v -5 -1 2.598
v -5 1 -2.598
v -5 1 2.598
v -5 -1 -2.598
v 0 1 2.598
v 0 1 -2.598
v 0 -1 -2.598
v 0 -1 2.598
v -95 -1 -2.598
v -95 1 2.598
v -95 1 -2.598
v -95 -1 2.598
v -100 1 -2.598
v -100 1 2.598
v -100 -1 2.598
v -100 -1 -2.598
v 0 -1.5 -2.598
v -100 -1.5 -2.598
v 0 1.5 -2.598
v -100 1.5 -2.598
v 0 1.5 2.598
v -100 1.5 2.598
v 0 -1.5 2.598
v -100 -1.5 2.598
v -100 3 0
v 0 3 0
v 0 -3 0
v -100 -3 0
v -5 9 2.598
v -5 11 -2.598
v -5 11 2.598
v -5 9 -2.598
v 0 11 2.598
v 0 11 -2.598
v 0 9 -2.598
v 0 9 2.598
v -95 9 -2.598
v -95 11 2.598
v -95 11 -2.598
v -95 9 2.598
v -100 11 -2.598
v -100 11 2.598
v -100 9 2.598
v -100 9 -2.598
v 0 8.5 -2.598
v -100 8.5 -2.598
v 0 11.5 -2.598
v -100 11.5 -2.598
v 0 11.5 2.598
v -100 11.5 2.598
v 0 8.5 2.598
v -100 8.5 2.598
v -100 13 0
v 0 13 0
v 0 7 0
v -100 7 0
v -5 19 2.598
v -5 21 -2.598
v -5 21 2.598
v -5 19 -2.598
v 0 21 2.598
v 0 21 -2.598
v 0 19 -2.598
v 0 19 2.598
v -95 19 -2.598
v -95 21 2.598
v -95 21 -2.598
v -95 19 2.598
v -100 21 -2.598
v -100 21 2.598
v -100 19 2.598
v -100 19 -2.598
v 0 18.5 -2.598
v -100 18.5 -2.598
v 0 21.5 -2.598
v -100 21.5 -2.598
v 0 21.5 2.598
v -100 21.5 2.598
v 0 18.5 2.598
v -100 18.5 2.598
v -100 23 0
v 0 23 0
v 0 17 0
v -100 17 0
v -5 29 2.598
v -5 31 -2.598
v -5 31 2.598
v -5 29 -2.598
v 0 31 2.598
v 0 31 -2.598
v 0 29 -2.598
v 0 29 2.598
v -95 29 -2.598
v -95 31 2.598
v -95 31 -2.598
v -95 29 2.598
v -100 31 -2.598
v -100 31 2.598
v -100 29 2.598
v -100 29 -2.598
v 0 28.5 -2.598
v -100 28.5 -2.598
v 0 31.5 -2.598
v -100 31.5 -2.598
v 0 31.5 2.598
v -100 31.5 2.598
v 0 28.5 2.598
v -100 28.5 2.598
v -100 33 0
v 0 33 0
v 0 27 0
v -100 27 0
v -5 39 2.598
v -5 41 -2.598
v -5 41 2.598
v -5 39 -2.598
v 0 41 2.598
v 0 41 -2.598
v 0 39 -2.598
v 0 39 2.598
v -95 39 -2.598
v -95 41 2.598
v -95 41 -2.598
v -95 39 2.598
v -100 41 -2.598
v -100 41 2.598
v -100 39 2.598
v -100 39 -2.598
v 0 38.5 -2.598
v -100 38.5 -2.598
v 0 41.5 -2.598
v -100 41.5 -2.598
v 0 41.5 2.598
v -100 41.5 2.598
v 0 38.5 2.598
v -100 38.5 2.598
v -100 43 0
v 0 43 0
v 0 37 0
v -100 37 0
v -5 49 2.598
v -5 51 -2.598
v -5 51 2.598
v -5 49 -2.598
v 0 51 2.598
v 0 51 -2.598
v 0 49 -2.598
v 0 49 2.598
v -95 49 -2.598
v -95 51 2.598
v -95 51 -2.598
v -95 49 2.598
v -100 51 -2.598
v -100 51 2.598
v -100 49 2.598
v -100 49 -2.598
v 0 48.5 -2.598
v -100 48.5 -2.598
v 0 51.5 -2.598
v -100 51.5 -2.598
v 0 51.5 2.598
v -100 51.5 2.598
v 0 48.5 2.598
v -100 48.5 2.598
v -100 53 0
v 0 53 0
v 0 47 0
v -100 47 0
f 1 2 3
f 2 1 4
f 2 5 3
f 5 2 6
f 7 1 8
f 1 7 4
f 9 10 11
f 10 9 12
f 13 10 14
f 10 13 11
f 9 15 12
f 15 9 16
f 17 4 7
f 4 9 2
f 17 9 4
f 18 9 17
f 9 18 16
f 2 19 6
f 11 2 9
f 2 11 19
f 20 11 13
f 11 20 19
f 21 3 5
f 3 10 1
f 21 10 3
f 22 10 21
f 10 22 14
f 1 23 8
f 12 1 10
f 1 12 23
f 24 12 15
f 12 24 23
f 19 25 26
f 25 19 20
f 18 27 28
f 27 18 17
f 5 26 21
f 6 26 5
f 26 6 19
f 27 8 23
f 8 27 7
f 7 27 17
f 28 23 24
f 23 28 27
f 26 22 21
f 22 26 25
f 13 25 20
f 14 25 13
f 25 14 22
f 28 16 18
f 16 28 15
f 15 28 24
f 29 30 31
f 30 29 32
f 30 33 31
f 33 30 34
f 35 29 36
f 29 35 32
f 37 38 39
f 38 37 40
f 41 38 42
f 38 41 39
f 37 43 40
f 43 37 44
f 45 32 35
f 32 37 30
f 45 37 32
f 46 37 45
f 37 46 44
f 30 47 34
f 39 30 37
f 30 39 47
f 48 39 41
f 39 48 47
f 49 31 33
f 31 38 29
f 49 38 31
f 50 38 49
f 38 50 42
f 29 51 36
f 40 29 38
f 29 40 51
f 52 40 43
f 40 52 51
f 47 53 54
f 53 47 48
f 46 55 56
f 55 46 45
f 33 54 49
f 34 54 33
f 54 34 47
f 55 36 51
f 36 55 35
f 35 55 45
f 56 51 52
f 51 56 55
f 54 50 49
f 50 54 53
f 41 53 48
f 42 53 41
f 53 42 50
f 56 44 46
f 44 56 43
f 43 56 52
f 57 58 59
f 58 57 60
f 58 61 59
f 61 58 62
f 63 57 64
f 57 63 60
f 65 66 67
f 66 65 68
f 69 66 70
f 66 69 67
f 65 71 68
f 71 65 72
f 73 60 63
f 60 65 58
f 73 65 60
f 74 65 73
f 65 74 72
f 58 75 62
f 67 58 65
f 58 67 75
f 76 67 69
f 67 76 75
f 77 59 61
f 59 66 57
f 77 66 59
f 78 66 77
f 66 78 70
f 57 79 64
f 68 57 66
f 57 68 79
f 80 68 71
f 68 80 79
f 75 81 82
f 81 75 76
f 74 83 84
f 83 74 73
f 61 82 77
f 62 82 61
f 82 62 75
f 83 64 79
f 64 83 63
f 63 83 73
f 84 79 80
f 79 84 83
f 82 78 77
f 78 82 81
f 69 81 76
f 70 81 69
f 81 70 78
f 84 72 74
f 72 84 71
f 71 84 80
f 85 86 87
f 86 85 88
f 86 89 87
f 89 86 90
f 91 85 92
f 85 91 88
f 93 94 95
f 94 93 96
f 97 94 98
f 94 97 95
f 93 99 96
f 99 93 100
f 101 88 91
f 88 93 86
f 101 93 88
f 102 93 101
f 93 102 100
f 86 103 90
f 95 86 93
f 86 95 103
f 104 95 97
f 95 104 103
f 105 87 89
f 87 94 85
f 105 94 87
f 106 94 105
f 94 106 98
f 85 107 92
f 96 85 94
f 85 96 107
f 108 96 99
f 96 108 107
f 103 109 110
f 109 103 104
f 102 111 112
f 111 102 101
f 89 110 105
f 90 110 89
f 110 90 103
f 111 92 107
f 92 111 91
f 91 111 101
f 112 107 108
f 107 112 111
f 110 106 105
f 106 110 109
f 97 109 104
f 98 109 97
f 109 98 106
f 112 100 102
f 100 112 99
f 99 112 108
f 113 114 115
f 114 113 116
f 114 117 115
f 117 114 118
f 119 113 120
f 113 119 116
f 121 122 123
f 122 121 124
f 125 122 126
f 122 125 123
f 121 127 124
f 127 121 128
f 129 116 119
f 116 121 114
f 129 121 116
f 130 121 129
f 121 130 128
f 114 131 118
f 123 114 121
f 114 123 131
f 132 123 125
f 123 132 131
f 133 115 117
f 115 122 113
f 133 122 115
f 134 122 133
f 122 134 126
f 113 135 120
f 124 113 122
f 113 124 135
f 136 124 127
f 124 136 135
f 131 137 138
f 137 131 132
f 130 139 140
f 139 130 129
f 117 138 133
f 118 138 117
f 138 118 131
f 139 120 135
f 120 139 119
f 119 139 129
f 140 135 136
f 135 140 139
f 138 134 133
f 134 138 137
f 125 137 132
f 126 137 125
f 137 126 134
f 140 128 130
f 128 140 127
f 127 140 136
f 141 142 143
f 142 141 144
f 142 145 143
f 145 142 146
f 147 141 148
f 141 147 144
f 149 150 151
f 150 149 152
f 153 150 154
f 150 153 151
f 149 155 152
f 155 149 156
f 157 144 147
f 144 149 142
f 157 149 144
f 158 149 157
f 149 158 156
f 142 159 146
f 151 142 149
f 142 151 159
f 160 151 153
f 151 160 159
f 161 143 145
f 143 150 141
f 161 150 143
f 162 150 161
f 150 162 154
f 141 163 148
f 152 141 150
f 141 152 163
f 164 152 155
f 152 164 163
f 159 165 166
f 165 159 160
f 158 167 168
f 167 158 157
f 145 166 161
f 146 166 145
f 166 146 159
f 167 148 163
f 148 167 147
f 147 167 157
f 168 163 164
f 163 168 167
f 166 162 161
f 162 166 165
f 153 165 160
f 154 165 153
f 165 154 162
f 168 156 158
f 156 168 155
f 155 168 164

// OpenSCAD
// Select strut or cap / Strebe oder Kappe auswaehlen
part = 0; // [0:Strut / Strebe, 1:Cap / Kappe]
// Number of sides / Anzahl der Seitenflaechen
fn = 6; // [3:60]
// Radius of part / Radius des Teils
r = 3.0;
// Width of slot / Weite des Schlitzes
sw = 2.0;
// Distance of parts / Abstand der Teile
dist = 10;
// Length of strut / Laenge einer Strebe
l = 100.0;
// Length of slot (in strut) / Laenge des Schlitzes (in der Strebe)
sl = 5.0;
// Index of bottom side / Index der Auflageflaeche
side = 0;
// Number of struts / Anzahl der Streben
ns = 6;
// Height of cap / Hoehe einer Kappe
h = 10.0;
// Height of bottom or 0 for a hood / Hoehe des Bodens oder 0 fuer eine Haube
b = 2.0;
// Thickness of wall of cap / Dicke der Wand einer Kappe
w = 1.0;
// Number of rows of caps / Anzahl der Reihen von Kappen
ncr = 3;
// Number of columns of caps / Anzahl der Spalten von Kappen
ncc = 2;

//  Struts for tensegrity models. Just rods with slots on both ends.
//  Streben fuer Tensegrity Modelle. Einfache Staebe mit Schlitzen an beiden Enden.
//  
//  Appropriate caps. Eventually use slightly larger radius.
//  Geeignete Kappen. Eventuell etwas groesseren Radius benutzen!
//

module strut(r, sw, l, sl, side) {
    rotate([0, -90, 0])
    rotate([0, 0, side*360/$fn])
    difference() {
        rotate([0, 0, 180 + 180/$fn]) cylinder(r=r, h=l);
        for (z = ([0:l:l])) translate([0, 0, z]) cube([2*r+1, sw, 2*sl], center=true);
    }
}

module cap(r, sw, h, b, w) {
    difference() {
        rotate([0, 0, 180/$fn]) difference() {
            union(){ 
            if (b == 0) { sphere(r=r+w); };
            cylinder(r=r+w, h=h);};
            translate([0, 0, b]) cylinder(r=r, h=h+0.1);
        }
        translate([-r-sw-1, -sw/2, b]) cube([2*(r+w+1), sw, h+0.1]);
    }
}

module struts(ns, dist, fn, r, sw, l, sl, side) {
    $fn=fn;
    for (y = ([0:1:ns-1])) translate([0, y*dist, 0]) 
        strut(r, sw, l, sl, side);
}

module caps(ncr, ncc, dist, fn, r, sw, h, b, w) {
    $fn = fn;
    for (x = ([0:1:ncr-1])) for (y = ([0:1:ncc-1])) translate([x*dist, y*dist, 0])
       cap(r, sw, h, b, w);
}

if (part == 0) {
    struts(ns, dist, fn, r, sw, l, sl, side);
} else {
    caps(ncr, ncc, dist, fn, r, sw, h, b, w);
}
